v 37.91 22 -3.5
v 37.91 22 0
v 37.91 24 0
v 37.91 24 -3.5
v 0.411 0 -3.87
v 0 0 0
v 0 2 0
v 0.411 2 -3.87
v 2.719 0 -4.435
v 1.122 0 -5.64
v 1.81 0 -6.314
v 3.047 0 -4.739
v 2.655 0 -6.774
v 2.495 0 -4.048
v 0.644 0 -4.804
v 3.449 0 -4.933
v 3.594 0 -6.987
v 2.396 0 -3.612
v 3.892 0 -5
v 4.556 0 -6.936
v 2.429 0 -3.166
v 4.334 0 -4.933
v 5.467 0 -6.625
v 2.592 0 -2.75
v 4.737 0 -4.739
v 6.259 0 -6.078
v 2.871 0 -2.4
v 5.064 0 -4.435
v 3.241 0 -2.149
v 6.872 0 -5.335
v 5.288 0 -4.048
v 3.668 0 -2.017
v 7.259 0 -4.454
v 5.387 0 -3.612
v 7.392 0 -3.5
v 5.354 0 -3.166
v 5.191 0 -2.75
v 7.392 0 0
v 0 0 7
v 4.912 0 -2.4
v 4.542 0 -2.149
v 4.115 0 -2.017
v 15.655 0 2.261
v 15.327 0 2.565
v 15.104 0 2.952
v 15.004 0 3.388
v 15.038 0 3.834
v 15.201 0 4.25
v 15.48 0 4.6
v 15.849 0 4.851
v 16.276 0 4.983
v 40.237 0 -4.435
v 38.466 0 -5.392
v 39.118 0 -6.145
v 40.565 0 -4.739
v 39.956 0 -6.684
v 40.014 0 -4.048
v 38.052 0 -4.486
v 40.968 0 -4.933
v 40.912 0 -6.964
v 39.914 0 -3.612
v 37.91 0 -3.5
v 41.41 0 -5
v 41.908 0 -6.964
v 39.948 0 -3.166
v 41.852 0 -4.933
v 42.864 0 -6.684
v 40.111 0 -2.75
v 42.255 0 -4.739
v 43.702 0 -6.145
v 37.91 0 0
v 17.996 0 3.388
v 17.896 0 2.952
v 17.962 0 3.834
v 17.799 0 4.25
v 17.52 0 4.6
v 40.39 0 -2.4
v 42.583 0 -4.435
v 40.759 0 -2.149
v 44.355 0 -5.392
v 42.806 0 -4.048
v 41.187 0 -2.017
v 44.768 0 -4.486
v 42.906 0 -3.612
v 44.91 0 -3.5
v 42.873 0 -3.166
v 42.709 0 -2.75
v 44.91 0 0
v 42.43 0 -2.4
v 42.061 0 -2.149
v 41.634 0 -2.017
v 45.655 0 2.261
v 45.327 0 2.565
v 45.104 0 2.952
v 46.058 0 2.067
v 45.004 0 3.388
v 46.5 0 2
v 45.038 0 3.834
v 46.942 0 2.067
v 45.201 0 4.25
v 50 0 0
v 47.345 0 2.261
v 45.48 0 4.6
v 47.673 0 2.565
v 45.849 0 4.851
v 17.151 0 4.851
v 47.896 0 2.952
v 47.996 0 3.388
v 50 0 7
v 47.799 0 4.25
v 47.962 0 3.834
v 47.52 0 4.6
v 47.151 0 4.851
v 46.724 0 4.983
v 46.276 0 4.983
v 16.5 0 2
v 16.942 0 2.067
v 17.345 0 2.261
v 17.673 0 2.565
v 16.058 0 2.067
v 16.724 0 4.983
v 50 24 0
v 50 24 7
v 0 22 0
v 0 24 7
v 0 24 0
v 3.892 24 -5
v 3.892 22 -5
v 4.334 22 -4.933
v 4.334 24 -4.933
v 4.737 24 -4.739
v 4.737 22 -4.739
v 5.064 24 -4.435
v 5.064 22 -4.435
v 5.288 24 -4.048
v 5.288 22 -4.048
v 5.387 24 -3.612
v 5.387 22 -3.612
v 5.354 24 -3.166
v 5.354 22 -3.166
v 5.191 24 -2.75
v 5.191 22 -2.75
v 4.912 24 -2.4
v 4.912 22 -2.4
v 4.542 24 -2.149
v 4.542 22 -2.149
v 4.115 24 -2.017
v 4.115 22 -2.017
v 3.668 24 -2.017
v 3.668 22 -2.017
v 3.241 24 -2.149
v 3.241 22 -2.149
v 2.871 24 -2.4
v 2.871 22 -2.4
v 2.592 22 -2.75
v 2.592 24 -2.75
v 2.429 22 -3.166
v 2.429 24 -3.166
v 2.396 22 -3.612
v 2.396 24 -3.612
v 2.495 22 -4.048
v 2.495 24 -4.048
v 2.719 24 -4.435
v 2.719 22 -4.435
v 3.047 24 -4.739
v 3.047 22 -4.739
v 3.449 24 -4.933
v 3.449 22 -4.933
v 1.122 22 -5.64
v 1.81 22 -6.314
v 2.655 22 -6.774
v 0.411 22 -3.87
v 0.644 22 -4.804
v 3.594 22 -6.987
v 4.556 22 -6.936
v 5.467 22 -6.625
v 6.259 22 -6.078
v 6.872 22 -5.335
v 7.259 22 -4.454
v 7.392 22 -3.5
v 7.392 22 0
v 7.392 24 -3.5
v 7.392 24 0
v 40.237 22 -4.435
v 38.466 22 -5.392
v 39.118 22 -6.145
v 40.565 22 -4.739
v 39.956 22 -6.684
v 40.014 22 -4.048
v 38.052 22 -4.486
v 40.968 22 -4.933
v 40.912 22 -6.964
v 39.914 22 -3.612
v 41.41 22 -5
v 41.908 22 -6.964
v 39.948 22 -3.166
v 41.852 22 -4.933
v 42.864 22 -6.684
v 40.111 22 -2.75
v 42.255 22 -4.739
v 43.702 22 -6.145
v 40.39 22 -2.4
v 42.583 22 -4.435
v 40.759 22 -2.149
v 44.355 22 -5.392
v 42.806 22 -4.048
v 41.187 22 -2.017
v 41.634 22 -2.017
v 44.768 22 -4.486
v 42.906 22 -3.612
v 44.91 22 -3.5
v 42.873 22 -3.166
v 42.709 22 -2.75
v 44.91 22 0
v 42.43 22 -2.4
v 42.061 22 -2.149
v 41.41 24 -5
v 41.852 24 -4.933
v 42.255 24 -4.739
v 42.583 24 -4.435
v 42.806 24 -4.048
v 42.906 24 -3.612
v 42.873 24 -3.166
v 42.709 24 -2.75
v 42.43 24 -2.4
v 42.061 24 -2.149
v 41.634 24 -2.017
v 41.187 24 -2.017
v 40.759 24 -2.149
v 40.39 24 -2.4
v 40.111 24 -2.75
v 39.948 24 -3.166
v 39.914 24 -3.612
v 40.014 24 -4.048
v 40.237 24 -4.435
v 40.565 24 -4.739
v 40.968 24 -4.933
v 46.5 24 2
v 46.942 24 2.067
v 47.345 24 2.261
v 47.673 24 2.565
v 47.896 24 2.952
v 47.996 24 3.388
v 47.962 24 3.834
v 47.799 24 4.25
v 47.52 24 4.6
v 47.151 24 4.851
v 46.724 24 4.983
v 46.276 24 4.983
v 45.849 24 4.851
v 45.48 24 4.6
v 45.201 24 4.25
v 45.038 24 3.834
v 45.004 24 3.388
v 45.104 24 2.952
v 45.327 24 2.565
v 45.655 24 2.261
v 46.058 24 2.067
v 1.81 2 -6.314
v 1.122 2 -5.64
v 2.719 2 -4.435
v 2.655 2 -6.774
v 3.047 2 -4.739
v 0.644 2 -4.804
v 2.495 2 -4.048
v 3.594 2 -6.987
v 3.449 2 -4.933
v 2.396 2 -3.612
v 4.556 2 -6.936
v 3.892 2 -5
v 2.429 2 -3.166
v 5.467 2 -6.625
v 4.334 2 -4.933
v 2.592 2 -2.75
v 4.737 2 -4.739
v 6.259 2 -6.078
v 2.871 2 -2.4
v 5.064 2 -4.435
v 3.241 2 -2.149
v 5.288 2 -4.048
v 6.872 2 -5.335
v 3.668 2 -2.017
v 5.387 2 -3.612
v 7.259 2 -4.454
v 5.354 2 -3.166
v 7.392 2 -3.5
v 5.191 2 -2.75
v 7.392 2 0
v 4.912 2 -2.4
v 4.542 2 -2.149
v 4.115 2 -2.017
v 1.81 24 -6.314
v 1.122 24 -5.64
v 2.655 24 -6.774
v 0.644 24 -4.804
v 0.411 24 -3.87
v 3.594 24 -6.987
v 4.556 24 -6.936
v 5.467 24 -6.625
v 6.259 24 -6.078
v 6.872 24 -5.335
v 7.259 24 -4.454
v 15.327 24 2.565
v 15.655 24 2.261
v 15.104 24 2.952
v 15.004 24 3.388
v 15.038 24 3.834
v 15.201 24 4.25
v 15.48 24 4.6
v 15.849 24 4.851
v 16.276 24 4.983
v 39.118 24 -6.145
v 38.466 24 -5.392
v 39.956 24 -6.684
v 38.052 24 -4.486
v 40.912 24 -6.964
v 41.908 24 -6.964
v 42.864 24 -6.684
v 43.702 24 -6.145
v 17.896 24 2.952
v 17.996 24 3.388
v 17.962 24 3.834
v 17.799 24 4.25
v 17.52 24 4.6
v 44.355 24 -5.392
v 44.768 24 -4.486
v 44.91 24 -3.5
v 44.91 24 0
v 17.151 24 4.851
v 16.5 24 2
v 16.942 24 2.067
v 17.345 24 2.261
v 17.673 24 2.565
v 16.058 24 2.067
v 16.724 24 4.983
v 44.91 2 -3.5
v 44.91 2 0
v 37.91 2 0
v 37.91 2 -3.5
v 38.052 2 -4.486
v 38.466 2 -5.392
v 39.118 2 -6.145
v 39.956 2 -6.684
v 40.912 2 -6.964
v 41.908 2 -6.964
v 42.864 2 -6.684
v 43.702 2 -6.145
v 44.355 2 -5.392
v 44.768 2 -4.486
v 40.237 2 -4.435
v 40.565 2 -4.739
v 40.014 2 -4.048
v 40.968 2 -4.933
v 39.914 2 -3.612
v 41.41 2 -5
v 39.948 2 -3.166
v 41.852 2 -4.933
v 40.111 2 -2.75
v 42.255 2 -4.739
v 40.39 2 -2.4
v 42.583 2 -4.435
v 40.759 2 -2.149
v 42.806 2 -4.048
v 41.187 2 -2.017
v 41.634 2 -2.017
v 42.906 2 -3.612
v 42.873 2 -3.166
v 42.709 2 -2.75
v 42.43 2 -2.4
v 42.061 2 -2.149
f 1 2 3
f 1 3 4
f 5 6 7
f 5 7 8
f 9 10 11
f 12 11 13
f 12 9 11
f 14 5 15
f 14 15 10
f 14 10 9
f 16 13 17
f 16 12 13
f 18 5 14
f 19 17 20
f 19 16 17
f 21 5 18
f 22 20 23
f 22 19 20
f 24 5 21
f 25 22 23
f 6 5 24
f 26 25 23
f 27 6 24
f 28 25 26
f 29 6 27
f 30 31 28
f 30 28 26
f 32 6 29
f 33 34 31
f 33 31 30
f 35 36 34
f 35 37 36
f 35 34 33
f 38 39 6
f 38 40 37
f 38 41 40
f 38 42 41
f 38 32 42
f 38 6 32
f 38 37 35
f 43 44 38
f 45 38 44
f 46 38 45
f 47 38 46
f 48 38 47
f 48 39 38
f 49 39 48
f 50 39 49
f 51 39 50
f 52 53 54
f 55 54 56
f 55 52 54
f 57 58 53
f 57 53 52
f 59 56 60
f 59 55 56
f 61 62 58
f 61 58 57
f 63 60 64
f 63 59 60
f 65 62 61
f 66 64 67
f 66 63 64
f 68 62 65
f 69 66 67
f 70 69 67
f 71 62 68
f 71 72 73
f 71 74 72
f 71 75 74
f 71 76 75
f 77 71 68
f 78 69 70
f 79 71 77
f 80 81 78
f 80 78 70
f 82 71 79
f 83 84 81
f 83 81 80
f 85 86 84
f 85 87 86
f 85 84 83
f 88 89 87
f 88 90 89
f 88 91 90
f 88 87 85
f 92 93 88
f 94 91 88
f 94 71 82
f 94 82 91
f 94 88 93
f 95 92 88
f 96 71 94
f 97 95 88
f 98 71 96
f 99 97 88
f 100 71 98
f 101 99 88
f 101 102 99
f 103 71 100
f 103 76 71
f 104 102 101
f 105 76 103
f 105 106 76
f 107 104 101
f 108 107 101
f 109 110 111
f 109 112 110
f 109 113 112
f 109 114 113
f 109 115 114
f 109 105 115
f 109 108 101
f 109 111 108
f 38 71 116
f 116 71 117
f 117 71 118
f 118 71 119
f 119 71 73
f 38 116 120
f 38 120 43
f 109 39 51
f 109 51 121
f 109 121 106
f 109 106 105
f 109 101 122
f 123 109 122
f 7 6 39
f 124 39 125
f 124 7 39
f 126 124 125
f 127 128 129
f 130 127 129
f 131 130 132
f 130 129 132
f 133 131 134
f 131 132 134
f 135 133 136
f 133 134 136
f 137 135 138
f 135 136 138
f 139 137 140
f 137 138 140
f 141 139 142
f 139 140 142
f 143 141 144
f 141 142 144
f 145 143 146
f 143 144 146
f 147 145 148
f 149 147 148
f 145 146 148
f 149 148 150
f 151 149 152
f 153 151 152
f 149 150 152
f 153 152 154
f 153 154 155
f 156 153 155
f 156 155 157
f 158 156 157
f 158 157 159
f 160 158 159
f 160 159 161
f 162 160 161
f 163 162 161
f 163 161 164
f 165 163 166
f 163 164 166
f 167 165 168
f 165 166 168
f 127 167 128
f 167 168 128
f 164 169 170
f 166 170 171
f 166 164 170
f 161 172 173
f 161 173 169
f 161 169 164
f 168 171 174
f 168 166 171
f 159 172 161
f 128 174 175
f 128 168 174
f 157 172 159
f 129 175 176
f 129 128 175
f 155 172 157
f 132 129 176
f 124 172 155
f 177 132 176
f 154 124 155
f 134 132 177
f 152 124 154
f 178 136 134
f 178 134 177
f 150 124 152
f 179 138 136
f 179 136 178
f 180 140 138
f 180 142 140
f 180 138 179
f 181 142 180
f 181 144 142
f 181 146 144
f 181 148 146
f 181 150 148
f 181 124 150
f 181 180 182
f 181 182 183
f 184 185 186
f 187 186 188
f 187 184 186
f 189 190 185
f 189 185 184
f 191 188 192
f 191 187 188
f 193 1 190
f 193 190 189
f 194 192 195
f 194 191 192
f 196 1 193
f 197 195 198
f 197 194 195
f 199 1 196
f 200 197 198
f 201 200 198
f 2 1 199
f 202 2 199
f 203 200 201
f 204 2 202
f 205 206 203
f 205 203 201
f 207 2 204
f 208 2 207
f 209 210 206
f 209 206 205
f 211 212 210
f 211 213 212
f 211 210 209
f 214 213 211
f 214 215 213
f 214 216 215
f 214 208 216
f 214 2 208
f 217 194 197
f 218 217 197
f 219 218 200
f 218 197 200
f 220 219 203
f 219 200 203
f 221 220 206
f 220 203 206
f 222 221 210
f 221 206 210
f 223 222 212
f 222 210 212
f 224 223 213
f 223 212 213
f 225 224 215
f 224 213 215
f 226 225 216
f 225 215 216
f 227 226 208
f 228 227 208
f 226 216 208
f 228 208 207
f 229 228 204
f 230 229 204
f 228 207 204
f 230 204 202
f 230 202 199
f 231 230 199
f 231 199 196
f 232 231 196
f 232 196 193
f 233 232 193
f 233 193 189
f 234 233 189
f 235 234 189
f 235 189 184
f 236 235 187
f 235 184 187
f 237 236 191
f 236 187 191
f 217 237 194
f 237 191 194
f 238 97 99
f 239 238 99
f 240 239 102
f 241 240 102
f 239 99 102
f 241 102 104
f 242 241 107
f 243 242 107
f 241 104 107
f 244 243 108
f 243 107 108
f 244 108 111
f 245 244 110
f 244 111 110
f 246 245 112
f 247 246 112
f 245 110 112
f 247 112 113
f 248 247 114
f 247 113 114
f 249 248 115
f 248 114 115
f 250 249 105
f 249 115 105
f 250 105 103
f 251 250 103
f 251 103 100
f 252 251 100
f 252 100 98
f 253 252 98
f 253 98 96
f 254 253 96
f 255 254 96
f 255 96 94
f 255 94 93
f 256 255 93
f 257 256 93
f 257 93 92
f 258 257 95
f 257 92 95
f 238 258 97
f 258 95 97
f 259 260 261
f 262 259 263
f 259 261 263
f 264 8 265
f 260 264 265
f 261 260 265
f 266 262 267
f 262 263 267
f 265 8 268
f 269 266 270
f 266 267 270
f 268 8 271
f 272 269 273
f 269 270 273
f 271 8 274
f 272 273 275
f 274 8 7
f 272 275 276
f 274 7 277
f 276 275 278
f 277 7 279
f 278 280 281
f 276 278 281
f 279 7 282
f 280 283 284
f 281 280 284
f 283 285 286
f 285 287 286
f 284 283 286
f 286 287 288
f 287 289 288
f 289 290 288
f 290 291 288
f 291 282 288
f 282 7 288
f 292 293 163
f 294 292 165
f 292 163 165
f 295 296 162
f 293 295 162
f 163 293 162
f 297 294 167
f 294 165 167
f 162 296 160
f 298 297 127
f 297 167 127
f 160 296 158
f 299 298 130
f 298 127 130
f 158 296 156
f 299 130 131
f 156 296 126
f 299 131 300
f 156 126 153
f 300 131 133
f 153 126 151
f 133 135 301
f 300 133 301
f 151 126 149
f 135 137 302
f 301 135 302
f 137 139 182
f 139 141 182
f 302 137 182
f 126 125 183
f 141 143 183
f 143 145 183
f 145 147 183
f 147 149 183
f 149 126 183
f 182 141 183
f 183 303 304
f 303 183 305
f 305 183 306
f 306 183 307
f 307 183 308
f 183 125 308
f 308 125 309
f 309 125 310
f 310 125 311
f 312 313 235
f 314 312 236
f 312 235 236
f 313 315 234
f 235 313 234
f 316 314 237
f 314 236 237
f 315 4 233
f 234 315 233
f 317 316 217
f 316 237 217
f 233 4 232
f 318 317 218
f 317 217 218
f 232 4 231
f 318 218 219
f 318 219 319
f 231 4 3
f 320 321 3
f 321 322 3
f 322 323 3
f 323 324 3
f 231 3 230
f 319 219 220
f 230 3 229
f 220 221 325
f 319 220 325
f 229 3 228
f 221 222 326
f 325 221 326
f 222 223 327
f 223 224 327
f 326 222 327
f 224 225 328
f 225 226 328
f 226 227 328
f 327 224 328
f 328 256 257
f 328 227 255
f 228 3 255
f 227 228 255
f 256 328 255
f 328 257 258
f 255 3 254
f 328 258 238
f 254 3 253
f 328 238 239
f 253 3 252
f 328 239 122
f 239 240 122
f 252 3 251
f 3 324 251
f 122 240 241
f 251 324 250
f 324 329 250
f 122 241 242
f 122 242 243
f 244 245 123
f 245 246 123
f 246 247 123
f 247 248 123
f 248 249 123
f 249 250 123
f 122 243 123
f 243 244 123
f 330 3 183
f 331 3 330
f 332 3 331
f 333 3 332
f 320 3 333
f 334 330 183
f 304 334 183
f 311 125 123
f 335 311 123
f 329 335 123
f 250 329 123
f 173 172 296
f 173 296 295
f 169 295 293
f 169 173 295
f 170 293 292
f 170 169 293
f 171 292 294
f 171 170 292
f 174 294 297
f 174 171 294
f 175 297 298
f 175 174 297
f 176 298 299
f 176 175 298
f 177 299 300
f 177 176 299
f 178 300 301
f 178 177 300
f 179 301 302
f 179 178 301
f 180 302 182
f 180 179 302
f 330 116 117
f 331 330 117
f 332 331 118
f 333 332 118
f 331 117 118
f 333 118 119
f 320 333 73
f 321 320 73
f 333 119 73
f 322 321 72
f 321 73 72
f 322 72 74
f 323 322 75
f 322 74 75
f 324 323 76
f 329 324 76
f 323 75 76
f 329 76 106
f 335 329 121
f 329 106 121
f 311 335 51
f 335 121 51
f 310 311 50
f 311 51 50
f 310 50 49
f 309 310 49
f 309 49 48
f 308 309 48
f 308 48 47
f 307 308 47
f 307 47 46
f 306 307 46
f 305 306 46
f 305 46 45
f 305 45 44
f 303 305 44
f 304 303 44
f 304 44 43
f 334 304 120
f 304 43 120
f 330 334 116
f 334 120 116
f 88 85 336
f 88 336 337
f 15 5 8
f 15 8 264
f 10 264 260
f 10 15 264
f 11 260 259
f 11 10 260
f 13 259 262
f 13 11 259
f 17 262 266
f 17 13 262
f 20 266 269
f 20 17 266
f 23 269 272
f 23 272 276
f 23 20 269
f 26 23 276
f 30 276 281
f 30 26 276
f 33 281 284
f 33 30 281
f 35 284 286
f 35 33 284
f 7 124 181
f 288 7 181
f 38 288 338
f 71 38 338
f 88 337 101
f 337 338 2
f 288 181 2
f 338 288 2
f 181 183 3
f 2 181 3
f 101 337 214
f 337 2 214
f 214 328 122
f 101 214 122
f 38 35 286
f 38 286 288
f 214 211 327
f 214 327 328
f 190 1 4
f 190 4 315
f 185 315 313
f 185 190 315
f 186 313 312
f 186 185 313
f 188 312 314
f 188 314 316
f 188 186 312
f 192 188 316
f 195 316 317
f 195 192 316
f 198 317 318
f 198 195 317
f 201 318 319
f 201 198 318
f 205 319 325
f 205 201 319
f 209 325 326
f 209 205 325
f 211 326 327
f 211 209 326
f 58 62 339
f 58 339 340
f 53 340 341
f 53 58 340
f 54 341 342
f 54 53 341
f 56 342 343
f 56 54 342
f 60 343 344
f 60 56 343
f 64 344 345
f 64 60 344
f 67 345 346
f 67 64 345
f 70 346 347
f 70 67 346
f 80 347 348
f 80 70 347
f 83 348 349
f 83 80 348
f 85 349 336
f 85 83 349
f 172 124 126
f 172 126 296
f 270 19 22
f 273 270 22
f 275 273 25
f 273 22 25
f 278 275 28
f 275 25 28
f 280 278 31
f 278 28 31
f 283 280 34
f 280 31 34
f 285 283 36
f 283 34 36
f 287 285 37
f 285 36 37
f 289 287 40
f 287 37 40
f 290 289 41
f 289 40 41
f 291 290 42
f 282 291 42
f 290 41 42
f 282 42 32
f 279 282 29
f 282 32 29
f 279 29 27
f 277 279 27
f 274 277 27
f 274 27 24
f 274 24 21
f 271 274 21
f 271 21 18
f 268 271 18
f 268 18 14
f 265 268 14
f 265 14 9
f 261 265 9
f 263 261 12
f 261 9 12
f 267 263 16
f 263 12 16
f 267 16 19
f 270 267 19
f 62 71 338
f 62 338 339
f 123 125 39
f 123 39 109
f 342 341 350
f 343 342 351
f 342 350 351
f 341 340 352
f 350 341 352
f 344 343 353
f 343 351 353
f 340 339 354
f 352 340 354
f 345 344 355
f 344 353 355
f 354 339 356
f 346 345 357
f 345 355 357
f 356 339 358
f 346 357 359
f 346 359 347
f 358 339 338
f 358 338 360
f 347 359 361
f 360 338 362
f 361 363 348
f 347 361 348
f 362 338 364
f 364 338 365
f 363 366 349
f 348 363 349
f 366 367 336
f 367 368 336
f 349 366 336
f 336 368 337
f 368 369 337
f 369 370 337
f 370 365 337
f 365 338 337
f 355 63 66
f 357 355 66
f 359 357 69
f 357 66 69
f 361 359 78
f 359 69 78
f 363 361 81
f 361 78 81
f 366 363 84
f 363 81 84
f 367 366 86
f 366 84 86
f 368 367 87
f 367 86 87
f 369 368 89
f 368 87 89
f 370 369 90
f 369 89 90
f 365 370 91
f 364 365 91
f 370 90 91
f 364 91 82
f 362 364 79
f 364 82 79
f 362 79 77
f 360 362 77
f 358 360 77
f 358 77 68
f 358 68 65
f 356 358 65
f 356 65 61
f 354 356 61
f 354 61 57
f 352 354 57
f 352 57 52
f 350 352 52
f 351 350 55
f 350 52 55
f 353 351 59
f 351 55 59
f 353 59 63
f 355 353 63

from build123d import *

# Parameters (mm, degrees)
SKETCH2_W           = 50
SKETCH2_H           = 24
BOSS_EXTRUDE1_DEPTH = 7
SKETCH3_R           = 1.5
BOSS_EXTRUDE2_DEPTH = 2
BOSS_EXTRUDE3_START = -22
SKETCH3_2_R         = 1.5
BOSS_EXTRUDE3_DEPTH = 2
SKETCH5_R           = 1.5
CUT_EXTRUDE1_DEPTH  = 24
SKETCH6_R           = 1.5
CUT_EXTRUDE2_DEPTH  = 24


with BuildPart() as part:
    # Sketch2 → Boss-Extrude1 (new body)
    with BuildSketch(Plane.XY):
        with Locations((25, 12)):
            Rectangle(SKETCH2_W, SKETCH2_H)
    extrude(amount=BOSS_EXTRUDE1_DEPTH)

    # Sketch3 → Boss-Extrude2 (add)
    # profile 1 of 2: a face of its own
    with BuildSketch(Plane.XZ):
        with BuildLine():
            Line((7.39152842, -3.5), (7.39152842, 0))
            Line((7.39152842, 0), (0, 0))
            Line((0, 0), (0.411114128, -3.869751751))
            ThreePointArc((0.411114128, -3.869751751), (4.076663477, -6.995100143), (7.39152842, -3.5))
        make_face()
        with Locations(Location((3.89152842, -3.5, 0), (0, 0, 270))):
            Circle(SKETCH3_R, mode=Mode.SUBTRACT)
    # profile 2 of 2: a face of its own
    with BuildSketch(Plane.XZ):
        with BuildLine():
            Line((44.910130544, -3.5), (44.910130544, 0))
            Line((44.910130544, 0), (37.910130544, 0))
            Line((37.910130544, 0), (37.910130544, -3.5))
            ThreePointArc((37.910130544, -3.5), (41.410130544, -7), (44.910130544, -3.5))
        make_face()
        with Locations(Location((41.410130544, -3.5, 0), (0, 0, 270))):
            Circle(SKETCH3_R, mode=Mode.SUBTRACT)
    extrude(amount=-BOSS_EXTRUDE2_DEPTH)

    # Sketch3<2> → Boss-Extrude3 (add)
    # profile 1 of 2: a face of its own
    with BuildSketch(Plane.XZ.offset(BOSS_EXTRUDE3_START)):
        with BuildLine():
            Line((7.39152842, -3.5), (7.39152842, 0))
            Line((7.39152842, 0), (0, 0))
            Line((0, 0), (0.411114128, -3.869751751))
            ThreePointArc((0.411114128, -3.869751751), (4.076663477, -6.995100143), (7.39152842, -3.5))
        make_face()
        with Locations(Location((3.89152842, -3.5, 0), (0, 0, 270))):
            Circle(SKETCH3_2_R, mode=Mode.SUBTRACT)
    # profile 2 of 2: a face of its own
    with BuildSketch(Plane.XZ.offset(BOSS_EXTRUDE3_START)):
        with BuildLine():
            Line((44.910130544, -3.5), (44.910130544, 0))
            Line((44.910130544, 0), (37.910130544, 0))
            Line((37.910130544, 0), (37.910130544, -3.5))
            ThreePointArc((37.910130544, -3.5), (41.410130544, -7), (44.910130544, -3.5))
        make_face()
        with Locations(Location((41.410130544, -3.5, 0), (0, 0, 270))):
            Circle(SKETCH3_2_R, mode=Mode.SUBTRACT)
    extrude(amount=-BOSS_EXTRUDE3_DEPTH)

    # Sketch5 → Cut-Extrude1 (cut)
    with BuildSketch(Plane.XZ):
        with Locations(Location((46.5, 3.5, 0), (0, 0, 270))):
            Circle(SKETCH5_R)
    extrude(amount=-CUT_EXTRUDE1_DEPTH, mode=Mode.SUBTRACT)

    # Sketch6 → Cut-Extrude2 (cut)
    with BuildSketch(Plane.XZ):
        with Locations(Location((16.5, 3.5, 0), (0, 0, 270))):
            Circle(SKETCH6_R)
    extrude(amount=-CUT_EXTRUDE2_DEPTH, mode=Mode.SUBTRACT)


solid = part.part
